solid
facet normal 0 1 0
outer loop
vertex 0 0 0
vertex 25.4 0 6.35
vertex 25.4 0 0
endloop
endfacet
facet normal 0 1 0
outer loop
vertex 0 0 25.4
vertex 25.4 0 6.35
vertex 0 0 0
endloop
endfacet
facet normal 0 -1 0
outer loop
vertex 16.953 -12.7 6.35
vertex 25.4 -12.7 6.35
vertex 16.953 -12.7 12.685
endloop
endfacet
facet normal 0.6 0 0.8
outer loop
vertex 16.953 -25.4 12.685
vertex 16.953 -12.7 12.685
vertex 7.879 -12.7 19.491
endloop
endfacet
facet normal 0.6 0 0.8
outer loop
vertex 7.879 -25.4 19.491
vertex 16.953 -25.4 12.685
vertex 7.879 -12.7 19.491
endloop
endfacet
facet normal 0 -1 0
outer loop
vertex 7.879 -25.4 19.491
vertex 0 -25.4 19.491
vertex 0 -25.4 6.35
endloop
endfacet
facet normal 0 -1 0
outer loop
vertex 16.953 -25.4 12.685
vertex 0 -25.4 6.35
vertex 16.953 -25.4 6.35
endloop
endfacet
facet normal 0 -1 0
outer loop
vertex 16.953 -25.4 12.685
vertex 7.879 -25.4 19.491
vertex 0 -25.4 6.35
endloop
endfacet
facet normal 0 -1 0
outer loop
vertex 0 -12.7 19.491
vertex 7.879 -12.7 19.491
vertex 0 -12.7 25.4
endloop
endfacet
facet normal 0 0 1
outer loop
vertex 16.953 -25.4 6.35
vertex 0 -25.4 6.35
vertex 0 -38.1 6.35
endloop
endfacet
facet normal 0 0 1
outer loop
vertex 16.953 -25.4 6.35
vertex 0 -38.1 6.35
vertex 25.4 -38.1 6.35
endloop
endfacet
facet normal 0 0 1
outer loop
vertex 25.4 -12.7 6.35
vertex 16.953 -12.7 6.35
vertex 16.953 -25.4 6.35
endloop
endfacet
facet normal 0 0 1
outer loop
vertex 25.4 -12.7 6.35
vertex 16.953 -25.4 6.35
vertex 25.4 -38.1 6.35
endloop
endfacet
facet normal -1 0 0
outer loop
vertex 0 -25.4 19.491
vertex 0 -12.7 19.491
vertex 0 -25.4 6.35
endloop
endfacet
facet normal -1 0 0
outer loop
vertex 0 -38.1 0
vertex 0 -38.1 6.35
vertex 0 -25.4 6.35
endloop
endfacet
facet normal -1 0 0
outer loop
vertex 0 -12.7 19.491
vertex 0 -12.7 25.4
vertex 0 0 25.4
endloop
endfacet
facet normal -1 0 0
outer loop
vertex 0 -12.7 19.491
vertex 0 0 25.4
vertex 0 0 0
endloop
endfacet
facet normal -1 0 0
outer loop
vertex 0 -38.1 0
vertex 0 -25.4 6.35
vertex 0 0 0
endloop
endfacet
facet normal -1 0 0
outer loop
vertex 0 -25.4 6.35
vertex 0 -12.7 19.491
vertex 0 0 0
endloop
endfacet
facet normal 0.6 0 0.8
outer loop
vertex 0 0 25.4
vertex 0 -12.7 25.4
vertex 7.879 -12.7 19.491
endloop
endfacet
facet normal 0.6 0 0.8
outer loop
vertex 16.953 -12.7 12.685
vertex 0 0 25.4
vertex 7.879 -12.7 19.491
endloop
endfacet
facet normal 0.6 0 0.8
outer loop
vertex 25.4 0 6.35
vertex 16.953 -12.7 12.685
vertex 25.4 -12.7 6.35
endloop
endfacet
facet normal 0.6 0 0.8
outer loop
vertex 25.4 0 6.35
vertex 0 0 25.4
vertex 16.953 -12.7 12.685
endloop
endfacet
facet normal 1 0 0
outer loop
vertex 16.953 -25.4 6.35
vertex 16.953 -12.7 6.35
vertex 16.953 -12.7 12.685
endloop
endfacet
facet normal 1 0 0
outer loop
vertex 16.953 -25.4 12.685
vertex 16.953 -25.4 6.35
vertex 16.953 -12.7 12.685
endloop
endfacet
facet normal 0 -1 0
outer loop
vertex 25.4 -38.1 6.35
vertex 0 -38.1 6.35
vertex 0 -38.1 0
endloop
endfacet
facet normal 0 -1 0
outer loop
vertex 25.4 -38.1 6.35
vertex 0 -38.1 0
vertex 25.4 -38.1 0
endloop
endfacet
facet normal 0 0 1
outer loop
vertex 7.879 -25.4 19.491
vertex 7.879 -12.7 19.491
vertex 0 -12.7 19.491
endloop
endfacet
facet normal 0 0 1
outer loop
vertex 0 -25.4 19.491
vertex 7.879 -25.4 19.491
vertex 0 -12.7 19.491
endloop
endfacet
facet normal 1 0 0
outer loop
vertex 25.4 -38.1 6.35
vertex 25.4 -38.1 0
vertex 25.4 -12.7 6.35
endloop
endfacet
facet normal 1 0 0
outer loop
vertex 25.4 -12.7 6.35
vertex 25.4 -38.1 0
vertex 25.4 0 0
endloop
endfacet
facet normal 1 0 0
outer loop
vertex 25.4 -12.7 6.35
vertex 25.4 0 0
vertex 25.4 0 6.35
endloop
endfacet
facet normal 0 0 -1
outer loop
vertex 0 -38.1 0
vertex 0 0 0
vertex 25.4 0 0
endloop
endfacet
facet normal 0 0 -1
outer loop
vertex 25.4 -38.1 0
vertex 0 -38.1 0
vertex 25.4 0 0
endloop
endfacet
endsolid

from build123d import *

# Parameters (mm, degrees)
F0_W     = 25.4
F0_H     = 6.35
F1_DEPTH = 38.1
F3_DEPTH = 12.7
F5_DEPTH = 12.7


with BuildPart() as f1:
    # F0 (on Front) → F1 (new body)
    with BuildSketch(Plane.XZ):
        with Locations((12.7, 3.175)):
            Rectangle(F0_W, F0_H)
    extrude(amount=F1_DEPTH)

    # F2 (on face) → F3 (join)
    with BuildSketch(Plane(origin=(0, 0, 0), x_dir=(-1, 0, 0), z_dir=(0, 1, 0))):
        Polygon((-25.4, 6.35), (0, 6.35), (0, 25.4), align=None)
    extrude(amount=-F3_DEPTH)

    # F4 (on face) → F5 (join)
    with BuildSketch(Plane.XZ.offset(12.7)):
        Polygon((0, 19.490924), (0, 6.35), (16.953341, 6.35), (16.953341, 12.684994), (7.878768, 19.490924), align=None)
    extrude(amount=F5_DEPTH)


solid = f1.part
